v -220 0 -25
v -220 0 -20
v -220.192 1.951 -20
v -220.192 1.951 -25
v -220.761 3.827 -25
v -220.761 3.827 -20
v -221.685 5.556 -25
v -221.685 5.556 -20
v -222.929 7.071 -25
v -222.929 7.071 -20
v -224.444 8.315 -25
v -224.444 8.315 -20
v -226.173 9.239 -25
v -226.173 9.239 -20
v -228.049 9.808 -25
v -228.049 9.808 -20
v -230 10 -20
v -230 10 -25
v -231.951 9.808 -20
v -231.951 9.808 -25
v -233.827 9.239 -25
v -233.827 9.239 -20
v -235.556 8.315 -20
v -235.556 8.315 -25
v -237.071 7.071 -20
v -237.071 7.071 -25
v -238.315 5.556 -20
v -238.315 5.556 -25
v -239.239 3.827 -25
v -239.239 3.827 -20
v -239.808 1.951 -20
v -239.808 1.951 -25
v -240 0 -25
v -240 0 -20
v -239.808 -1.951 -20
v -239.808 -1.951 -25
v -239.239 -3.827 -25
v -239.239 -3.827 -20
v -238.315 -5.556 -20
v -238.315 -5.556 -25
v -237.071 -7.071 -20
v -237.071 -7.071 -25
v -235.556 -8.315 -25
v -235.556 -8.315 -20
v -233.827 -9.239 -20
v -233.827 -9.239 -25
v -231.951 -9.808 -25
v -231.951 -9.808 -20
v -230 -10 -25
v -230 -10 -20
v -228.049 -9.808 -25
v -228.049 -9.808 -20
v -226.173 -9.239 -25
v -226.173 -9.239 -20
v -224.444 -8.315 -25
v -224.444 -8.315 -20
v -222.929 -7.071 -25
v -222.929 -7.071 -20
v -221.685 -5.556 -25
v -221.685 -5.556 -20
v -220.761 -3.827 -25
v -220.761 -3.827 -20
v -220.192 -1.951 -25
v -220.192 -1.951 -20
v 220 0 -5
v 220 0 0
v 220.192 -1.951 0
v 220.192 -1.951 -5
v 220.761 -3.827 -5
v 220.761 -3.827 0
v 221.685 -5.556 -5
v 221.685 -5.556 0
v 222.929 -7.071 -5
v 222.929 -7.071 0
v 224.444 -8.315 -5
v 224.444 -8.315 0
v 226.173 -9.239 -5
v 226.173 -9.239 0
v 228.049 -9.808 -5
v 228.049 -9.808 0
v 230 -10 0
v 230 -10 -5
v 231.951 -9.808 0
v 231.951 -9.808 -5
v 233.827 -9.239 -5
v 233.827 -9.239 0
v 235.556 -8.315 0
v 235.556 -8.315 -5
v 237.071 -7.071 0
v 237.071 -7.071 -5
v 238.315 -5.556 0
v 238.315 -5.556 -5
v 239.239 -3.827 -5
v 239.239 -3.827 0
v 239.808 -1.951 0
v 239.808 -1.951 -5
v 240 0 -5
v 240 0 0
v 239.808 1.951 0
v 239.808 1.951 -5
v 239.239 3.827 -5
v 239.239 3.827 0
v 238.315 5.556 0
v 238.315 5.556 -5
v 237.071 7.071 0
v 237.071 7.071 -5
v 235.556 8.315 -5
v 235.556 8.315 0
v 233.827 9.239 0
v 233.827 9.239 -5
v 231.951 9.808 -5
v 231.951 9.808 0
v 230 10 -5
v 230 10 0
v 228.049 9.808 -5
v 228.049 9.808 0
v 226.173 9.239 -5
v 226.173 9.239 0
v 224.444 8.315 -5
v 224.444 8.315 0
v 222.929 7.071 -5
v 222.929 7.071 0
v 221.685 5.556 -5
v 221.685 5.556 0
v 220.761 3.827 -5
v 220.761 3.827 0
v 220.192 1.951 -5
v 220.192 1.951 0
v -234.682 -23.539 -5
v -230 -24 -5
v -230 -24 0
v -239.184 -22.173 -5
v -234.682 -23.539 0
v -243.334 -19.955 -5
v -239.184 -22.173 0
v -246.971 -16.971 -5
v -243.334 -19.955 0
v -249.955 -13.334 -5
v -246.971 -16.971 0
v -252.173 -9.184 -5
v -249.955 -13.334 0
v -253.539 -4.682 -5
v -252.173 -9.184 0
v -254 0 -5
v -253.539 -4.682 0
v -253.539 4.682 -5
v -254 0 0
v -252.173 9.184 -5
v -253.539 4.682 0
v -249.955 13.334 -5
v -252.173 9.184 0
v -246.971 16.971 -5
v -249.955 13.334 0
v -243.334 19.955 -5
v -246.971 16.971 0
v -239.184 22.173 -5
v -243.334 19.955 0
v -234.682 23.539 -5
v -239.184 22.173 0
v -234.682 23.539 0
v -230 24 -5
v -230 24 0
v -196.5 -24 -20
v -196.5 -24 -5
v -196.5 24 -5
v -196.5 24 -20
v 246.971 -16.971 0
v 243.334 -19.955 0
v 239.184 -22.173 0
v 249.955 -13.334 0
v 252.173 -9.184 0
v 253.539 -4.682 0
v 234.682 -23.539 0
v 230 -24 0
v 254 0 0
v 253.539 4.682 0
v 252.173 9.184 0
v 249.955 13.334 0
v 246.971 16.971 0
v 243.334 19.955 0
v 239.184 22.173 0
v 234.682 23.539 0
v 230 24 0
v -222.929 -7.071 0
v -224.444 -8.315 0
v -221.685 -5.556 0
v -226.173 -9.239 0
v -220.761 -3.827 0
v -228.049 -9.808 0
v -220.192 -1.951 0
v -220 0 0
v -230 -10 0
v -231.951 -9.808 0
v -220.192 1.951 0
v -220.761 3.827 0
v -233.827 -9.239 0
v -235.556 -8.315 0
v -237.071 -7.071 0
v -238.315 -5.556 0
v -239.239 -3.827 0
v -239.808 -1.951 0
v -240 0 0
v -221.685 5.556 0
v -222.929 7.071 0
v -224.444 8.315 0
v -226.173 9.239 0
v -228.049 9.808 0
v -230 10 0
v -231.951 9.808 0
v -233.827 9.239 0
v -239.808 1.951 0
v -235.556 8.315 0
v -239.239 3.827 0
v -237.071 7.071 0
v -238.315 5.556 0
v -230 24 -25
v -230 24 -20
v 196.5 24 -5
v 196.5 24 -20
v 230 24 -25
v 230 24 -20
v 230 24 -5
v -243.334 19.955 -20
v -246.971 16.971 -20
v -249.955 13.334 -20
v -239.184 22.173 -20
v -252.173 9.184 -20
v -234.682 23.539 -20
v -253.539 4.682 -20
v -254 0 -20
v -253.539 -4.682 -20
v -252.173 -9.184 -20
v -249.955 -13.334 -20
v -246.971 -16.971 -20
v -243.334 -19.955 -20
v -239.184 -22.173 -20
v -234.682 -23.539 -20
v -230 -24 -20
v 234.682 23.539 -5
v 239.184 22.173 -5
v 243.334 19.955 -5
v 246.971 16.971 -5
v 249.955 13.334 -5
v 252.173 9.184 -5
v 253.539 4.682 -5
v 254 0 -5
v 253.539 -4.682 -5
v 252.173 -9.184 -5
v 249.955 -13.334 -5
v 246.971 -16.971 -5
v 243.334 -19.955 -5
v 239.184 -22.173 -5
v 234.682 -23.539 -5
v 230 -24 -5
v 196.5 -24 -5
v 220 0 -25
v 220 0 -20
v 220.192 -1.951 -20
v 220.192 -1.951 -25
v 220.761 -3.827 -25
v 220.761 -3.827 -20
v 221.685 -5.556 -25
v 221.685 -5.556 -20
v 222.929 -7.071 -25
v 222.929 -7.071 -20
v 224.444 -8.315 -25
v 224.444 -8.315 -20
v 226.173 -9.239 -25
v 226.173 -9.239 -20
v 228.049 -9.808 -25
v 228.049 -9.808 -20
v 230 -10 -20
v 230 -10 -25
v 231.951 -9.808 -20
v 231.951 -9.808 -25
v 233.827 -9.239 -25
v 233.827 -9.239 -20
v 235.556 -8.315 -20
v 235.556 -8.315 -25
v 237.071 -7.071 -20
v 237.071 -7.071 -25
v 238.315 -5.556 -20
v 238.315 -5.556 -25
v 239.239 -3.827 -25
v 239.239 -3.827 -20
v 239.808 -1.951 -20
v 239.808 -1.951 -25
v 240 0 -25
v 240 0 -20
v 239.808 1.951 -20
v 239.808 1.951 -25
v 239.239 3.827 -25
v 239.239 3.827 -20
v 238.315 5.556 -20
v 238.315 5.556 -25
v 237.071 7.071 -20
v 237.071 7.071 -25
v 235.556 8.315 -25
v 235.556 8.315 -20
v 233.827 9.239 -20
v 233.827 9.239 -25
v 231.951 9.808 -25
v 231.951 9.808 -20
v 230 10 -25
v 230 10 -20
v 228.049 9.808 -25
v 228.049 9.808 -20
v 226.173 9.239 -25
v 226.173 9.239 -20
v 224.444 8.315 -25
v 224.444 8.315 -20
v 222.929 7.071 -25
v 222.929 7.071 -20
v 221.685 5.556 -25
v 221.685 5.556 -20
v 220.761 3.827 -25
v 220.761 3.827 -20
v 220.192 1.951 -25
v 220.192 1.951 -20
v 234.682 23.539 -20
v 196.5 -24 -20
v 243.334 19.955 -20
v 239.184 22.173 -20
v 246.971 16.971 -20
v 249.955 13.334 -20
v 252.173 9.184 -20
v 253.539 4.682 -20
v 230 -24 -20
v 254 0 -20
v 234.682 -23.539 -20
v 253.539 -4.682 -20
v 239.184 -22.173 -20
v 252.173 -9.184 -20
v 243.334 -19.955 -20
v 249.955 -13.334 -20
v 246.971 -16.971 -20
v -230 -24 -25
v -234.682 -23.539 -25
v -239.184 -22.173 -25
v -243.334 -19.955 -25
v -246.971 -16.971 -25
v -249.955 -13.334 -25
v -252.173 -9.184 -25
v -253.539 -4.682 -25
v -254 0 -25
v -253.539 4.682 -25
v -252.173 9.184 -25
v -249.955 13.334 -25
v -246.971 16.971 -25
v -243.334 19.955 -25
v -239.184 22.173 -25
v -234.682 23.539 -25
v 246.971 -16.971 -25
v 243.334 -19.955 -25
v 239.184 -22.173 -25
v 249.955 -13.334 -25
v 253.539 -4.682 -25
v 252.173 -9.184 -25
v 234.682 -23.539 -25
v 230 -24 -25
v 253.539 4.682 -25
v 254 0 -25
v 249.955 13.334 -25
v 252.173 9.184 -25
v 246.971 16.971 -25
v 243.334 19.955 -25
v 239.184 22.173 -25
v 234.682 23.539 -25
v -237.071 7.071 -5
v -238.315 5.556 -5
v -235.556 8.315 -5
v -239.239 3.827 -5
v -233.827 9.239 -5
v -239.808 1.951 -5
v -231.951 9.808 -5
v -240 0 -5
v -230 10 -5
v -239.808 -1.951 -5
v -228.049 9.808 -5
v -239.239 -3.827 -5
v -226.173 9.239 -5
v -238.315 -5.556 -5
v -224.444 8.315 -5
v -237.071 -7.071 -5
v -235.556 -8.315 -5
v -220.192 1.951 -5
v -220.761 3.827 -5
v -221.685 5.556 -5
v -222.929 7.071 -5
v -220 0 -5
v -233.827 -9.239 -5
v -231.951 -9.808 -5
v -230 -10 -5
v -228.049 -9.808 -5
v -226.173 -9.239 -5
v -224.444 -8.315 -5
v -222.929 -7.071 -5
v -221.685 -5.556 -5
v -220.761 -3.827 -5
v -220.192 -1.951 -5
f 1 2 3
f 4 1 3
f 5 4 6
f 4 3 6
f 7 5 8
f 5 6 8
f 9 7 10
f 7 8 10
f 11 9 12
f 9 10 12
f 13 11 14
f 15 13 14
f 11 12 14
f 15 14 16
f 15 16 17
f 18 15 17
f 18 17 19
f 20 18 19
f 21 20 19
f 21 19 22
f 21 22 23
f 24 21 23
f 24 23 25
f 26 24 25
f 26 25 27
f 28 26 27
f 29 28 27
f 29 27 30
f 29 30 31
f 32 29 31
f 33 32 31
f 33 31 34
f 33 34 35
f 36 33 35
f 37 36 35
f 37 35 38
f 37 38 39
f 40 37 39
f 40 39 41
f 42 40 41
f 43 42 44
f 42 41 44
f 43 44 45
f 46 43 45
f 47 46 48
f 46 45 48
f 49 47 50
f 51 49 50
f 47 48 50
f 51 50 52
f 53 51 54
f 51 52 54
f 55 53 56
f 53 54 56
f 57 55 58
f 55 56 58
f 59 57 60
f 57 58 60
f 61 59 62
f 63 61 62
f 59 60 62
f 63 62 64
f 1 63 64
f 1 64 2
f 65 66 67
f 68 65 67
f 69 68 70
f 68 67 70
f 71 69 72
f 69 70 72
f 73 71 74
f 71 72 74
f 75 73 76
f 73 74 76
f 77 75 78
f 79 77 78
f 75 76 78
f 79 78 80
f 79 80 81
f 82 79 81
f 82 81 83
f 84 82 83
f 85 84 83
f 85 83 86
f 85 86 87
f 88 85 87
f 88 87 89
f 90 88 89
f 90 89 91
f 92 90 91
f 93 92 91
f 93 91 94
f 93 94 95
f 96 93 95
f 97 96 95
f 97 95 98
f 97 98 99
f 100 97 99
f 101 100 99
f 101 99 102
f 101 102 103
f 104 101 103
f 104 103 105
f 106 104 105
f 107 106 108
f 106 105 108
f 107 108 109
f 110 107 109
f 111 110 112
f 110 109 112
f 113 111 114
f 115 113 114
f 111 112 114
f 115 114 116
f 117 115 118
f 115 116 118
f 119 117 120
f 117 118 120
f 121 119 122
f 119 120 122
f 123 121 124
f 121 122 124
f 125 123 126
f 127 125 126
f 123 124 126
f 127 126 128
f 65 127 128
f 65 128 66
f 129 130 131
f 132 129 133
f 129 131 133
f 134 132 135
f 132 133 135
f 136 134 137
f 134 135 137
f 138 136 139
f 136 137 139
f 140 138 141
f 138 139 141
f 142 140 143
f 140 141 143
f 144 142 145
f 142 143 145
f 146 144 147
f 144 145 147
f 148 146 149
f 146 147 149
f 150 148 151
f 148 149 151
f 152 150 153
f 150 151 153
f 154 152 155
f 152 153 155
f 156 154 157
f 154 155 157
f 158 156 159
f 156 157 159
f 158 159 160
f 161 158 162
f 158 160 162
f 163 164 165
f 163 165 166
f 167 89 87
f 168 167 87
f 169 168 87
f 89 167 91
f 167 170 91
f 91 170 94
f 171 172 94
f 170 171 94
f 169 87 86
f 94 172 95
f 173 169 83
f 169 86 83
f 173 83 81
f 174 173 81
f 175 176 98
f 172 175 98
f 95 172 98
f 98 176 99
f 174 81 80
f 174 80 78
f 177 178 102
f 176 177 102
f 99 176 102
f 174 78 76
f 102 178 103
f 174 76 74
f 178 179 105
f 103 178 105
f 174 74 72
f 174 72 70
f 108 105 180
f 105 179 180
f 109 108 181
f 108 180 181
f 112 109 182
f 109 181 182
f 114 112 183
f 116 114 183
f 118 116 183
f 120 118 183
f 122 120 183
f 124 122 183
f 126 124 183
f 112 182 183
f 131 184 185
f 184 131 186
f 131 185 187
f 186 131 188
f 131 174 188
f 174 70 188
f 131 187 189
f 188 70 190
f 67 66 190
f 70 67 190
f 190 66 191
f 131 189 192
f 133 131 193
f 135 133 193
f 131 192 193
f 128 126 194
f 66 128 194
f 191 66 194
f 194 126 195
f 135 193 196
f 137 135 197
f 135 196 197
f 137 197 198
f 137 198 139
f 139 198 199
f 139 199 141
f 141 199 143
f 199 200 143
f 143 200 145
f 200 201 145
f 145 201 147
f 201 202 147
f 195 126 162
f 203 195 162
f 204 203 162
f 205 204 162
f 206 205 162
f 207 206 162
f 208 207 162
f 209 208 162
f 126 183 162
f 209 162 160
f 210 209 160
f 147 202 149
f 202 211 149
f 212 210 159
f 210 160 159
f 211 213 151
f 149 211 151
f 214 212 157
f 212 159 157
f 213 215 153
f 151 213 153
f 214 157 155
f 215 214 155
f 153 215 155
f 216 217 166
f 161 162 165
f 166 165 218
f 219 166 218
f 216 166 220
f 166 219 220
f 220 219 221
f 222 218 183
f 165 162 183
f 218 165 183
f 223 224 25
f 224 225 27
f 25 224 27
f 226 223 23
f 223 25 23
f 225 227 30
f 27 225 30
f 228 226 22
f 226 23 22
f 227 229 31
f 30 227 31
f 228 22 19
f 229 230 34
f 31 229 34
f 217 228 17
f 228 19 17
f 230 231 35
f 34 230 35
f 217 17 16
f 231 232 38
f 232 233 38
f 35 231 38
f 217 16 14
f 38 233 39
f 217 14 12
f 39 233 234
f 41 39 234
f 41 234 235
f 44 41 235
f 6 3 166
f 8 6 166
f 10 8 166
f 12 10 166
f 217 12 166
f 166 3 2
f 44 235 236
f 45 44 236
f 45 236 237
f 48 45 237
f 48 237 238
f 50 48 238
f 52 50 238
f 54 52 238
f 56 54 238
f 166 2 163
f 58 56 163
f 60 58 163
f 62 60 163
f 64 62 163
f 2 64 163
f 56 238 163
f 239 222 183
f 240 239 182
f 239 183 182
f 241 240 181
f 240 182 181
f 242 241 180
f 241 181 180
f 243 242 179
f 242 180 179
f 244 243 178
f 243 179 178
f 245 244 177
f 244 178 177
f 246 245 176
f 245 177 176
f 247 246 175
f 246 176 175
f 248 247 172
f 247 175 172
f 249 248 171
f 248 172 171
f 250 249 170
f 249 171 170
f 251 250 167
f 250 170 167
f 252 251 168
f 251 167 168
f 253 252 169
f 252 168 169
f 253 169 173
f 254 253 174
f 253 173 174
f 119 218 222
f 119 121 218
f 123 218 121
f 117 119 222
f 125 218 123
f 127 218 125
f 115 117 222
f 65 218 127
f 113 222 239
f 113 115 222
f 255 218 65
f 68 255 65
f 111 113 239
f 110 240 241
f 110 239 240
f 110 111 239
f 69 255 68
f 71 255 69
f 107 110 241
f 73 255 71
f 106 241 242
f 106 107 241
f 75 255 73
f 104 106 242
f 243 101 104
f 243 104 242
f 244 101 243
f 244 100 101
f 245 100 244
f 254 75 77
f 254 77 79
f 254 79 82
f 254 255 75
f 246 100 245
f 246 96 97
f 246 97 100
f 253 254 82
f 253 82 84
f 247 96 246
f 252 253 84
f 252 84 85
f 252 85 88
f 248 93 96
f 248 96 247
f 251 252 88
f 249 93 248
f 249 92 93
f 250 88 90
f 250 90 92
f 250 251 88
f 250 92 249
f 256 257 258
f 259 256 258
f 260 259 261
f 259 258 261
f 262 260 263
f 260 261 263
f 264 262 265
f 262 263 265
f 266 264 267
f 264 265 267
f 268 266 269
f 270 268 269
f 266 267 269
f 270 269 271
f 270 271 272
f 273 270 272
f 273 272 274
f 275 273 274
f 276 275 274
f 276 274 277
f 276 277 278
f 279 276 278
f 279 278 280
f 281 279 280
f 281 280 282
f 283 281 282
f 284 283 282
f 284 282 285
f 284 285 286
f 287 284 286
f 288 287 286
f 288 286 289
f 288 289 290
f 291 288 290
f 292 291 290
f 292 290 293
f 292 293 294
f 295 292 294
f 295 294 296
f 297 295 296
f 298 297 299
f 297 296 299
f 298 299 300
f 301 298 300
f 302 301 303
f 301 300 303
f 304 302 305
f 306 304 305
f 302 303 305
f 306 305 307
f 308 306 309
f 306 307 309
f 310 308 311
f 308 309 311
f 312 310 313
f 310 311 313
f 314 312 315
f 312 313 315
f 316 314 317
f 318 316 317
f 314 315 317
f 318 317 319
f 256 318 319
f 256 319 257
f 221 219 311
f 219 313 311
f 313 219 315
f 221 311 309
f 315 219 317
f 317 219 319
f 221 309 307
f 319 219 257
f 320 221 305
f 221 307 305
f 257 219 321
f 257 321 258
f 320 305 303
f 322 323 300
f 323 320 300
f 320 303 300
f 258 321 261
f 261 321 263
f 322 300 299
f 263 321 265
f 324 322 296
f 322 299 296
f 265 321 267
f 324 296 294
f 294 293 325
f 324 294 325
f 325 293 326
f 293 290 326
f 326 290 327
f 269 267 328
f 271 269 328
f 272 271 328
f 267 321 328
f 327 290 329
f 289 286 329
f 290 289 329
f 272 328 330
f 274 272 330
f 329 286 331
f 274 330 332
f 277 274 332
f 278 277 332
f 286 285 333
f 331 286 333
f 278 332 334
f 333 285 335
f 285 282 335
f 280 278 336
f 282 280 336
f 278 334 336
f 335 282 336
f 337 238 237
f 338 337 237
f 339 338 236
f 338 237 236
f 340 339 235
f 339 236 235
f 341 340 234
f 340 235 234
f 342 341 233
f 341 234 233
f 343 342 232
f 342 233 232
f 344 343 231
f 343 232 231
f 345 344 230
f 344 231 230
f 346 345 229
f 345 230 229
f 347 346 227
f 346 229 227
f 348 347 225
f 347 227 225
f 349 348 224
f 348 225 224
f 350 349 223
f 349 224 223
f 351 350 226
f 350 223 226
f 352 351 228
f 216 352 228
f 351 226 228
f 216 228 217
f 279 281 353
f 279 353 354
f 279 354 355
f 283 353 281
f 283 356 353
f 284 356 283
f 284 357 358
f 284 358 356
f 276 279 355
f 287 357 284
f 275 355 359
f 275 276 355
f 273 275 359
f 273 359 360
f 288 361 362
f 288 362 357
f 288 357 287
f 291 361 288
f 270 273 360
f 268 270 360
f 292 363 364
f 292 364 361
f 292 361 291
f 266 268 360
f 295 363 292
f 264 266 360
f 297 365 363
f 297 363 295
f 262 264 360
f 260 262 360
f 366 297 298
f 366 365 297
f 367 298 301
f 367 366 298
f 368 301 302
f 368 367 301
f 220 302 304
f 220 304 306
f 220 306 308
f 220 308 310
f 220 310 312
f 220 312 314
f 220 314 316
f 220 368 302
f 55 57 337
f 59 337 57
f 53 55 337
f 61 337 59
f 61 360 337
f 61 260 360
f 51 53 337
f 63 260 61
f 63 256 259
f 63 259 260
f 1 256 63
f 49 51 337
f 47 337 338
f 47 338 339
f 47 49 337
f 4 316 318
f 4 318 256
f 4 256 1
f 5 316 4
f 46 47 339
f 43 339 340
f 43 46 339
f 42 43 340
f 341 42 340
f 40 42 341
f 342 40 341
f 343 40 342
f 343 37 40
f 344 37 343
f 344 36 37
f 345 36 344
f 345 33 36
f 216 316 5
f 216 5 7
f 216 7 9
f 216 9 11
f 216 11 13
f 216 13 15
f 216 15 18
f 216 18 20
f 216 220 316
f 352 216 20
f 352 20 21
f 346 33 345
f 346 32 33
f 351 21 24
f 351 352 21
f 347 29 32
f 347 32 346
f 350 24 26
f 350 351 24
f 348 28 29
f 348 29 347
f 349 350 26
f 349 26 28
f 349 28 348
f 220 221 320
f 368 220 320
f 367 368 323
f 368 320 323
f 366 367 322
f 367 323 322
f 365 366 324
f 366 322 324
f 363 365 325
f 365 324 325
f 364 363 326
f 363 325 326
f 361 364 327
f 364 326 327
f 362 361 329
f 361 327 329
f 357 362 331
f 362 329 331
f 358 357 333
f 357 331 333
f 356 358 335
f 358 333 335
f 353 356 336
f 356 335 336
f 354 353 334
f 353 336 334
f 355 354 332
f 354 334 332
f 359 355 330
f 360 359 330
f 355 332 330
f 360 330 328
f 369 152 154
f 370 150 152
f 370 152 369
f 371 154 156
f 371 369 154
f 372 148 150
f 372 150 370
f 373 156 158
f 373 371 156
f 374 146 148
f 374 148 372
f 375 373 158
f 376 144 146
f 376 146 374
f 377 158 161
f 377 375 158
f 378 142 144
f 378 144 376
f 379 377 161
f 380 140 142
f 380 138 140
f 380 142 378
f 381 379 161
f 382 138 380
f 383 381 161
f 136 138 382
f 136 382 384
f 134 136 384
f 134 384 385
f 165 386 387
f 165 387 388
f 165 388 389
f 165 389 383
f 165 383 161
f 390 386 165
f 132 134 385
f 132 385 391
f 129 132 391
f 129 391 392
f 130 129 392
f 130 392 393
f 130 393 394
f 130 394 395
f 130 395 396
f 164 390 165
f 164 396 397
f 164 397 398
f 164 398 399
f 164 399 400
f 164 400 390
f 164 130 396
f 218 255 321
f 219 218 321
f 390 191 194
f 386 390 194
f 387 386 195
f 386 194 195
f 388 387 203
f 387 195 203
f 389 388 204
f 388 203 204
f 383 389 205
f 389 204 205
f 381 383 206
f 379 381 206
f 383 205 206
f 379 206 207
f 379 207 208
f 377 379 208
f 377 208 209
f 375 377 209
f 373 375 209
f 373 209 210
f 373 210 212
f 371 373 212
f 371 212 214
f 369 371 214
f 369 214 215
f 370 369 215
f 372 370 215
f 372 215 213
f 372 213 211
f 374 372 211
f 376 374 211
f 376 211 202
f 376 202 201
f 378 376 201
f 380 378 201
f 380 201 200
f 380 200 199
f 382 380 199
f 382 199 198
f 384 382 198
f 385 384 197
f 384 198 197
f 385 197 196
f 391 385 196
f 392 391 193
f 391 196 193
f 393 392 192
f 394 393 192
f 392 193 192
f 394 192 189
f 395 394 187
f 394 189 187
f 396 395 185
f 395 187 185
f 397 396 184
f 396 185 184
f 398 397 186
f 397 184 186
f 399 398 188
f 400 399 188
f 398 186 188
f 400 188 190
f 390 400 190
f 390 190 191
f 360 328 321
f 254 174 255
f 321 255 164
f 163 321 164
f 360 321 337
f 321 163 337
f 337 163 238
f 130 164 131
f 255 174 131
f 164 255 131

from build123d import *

# Parameters (mm, degrees)
SKETCH1_R               = 10
BOSS_EXTRUDE1_DEPTH     = 25
CUT_EXTRUDE2_DEPTH      = 257.353271873
CUT_EXTRUDE2_DEPTH_BACK = 257.353271873
SKETCH3_W               = 67
SKETCH3_H               = 15


with BuildPart() as part:
    # Sketch1 → Boss-Extrude1 (new body)
    with BuildSketch(Plane.XY):
        with BuildLine():
            Line((-230, 24), (230, 24))
            ThreePointArc((230, 24), (254, 0), (230, -24))
            Line((230, -24), (-230, -24))
            ThreePointArc((-230, -24), (-254, 0), (-230, 24))
        make_face()
        with Locations((-230, 0)):
            Circle(SKETCH1_R, mode=Mode.SUBTRACT)
        with Locations(Location((230, 0, 0), (0, 0, 180))):
            Circle(SKETCH1_R, mode=Mode.SUBTRACT)
    extrude(amount=-BOSS_EXTRUDE1_DEPTH)

    # Sketch3 → Cut-Extrude2 (cut, two sides: drawn at the far end of the back side and taken through both)
    with BuildSketch(Plane(origin=(0, 0, 0), x_dir=(1, 0, 0), z_dir=(0, 1, 0)).offset(-CUT_EXTRUDE2_DEPTH_BACK)):
        with Locations((-230, 12.5)):
            Rectangle(SKETCH3_W, SKETCH3_H)
        with Locations((230, 12.5)):
            Rectangle(SKETCH3_W, SKETCH3_H)
    extrude(amount=CUT_EXTRUDE2_DEPTH + CUT_EXTRUDE2_DEPTH_BACK, mode=Mode.SUBTRACT)


solid = part.part
